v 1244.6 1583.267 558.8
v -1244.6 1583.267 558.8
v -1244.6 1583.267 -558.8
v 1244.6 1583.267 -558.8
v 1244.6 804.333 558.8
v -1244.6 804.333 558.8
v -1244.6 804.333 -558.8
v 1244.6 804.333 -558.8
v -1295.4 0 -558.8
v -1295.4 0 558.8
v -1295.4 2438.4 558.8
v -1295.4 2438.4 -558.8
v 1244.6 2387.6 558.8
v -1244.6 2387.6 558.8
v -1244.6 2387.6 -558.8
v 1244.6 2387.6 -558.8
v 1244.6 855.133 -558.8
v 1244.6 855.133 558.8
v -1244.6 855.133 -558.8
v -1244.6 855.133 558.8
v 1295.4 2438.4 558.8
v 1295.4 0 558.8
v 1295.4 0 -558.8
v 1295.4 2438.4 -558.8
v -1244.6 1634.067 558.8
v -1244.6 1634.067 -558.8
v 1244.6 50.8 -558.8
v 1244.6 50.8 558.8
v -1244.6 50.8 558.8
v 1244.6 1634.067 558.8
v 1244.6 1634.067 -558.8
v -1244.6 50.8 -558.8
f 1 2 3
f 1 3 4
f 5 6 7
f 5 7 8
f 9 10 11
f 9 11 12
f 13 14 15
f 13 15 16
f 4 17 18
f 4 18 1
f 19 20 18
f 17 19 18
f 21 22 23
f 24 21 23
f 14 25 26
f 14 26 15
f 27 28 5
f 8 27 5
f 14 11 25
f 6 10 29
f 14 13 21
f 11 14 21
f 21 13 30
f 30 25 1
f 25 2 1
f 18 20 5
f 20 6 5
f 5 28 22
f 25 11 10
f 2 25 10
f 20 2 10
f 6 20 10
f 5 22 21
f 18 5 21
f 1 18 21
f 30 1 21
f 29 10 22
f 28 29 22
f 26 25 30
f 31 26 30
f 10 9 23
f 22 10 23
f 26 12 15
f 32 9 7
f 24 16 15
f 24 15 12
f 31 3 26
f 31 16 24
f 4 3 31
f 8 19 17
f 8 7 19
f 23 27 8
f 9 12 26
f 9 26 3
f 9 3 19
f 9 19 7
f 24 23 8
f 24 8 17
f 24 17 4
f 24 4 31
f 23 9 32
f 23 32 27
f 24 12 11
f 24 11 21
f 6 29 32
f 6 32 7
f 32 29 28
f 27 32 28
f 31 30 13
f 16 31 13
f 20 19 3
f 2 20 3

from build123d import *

# Parameters (mm, degrees)
SKETCH1_W           = 2590.8
SKETCH1_H           = 1117.6
BOSS_EXTRUDE1_DEPTH = 2438.4
SKETCH2_W           = 2489.2
SKETCH2_H           = 753.533333333
SKETCH2_H_2         = 728.133333334
CUT_EXTRUDE1_DEPTH  = 2979.738907659


with BuildPart() as part:
    # Sketch1 → Boss-Extrude1 (new body)
    with BuildSketch(Plane(origin=(0, 0, 0), x_dir=(1, 0, 0), z_dir=(0, 1, 0))):
        Rectangle(SKETCH1_W, SKETCH1_H)
    extrude(amount=BOSS_EXTRUDE1_DEPTH)

    # Sketch2 → Cut-Extrude1 (cut, through all)
    with BuildSketch(Plane.XY.offset(558.8)):
        with Locations((0, 427.566666666)):
            Rectangle(SKETCH2_W, SKETCH2_H)
        with Locations((0, 2010.833333334)):
            Rectangle(SKETCH2_W, SKETCH2_H)
        with Locations((0, 1219.2)):
            Rectangle(SKETCH2_W, SKETCH2_H_2)
    extrude(amount=-CUT_EXTRUDE1_DEPTH, mode=Mode.SUBTRACT)


solid = part.part
